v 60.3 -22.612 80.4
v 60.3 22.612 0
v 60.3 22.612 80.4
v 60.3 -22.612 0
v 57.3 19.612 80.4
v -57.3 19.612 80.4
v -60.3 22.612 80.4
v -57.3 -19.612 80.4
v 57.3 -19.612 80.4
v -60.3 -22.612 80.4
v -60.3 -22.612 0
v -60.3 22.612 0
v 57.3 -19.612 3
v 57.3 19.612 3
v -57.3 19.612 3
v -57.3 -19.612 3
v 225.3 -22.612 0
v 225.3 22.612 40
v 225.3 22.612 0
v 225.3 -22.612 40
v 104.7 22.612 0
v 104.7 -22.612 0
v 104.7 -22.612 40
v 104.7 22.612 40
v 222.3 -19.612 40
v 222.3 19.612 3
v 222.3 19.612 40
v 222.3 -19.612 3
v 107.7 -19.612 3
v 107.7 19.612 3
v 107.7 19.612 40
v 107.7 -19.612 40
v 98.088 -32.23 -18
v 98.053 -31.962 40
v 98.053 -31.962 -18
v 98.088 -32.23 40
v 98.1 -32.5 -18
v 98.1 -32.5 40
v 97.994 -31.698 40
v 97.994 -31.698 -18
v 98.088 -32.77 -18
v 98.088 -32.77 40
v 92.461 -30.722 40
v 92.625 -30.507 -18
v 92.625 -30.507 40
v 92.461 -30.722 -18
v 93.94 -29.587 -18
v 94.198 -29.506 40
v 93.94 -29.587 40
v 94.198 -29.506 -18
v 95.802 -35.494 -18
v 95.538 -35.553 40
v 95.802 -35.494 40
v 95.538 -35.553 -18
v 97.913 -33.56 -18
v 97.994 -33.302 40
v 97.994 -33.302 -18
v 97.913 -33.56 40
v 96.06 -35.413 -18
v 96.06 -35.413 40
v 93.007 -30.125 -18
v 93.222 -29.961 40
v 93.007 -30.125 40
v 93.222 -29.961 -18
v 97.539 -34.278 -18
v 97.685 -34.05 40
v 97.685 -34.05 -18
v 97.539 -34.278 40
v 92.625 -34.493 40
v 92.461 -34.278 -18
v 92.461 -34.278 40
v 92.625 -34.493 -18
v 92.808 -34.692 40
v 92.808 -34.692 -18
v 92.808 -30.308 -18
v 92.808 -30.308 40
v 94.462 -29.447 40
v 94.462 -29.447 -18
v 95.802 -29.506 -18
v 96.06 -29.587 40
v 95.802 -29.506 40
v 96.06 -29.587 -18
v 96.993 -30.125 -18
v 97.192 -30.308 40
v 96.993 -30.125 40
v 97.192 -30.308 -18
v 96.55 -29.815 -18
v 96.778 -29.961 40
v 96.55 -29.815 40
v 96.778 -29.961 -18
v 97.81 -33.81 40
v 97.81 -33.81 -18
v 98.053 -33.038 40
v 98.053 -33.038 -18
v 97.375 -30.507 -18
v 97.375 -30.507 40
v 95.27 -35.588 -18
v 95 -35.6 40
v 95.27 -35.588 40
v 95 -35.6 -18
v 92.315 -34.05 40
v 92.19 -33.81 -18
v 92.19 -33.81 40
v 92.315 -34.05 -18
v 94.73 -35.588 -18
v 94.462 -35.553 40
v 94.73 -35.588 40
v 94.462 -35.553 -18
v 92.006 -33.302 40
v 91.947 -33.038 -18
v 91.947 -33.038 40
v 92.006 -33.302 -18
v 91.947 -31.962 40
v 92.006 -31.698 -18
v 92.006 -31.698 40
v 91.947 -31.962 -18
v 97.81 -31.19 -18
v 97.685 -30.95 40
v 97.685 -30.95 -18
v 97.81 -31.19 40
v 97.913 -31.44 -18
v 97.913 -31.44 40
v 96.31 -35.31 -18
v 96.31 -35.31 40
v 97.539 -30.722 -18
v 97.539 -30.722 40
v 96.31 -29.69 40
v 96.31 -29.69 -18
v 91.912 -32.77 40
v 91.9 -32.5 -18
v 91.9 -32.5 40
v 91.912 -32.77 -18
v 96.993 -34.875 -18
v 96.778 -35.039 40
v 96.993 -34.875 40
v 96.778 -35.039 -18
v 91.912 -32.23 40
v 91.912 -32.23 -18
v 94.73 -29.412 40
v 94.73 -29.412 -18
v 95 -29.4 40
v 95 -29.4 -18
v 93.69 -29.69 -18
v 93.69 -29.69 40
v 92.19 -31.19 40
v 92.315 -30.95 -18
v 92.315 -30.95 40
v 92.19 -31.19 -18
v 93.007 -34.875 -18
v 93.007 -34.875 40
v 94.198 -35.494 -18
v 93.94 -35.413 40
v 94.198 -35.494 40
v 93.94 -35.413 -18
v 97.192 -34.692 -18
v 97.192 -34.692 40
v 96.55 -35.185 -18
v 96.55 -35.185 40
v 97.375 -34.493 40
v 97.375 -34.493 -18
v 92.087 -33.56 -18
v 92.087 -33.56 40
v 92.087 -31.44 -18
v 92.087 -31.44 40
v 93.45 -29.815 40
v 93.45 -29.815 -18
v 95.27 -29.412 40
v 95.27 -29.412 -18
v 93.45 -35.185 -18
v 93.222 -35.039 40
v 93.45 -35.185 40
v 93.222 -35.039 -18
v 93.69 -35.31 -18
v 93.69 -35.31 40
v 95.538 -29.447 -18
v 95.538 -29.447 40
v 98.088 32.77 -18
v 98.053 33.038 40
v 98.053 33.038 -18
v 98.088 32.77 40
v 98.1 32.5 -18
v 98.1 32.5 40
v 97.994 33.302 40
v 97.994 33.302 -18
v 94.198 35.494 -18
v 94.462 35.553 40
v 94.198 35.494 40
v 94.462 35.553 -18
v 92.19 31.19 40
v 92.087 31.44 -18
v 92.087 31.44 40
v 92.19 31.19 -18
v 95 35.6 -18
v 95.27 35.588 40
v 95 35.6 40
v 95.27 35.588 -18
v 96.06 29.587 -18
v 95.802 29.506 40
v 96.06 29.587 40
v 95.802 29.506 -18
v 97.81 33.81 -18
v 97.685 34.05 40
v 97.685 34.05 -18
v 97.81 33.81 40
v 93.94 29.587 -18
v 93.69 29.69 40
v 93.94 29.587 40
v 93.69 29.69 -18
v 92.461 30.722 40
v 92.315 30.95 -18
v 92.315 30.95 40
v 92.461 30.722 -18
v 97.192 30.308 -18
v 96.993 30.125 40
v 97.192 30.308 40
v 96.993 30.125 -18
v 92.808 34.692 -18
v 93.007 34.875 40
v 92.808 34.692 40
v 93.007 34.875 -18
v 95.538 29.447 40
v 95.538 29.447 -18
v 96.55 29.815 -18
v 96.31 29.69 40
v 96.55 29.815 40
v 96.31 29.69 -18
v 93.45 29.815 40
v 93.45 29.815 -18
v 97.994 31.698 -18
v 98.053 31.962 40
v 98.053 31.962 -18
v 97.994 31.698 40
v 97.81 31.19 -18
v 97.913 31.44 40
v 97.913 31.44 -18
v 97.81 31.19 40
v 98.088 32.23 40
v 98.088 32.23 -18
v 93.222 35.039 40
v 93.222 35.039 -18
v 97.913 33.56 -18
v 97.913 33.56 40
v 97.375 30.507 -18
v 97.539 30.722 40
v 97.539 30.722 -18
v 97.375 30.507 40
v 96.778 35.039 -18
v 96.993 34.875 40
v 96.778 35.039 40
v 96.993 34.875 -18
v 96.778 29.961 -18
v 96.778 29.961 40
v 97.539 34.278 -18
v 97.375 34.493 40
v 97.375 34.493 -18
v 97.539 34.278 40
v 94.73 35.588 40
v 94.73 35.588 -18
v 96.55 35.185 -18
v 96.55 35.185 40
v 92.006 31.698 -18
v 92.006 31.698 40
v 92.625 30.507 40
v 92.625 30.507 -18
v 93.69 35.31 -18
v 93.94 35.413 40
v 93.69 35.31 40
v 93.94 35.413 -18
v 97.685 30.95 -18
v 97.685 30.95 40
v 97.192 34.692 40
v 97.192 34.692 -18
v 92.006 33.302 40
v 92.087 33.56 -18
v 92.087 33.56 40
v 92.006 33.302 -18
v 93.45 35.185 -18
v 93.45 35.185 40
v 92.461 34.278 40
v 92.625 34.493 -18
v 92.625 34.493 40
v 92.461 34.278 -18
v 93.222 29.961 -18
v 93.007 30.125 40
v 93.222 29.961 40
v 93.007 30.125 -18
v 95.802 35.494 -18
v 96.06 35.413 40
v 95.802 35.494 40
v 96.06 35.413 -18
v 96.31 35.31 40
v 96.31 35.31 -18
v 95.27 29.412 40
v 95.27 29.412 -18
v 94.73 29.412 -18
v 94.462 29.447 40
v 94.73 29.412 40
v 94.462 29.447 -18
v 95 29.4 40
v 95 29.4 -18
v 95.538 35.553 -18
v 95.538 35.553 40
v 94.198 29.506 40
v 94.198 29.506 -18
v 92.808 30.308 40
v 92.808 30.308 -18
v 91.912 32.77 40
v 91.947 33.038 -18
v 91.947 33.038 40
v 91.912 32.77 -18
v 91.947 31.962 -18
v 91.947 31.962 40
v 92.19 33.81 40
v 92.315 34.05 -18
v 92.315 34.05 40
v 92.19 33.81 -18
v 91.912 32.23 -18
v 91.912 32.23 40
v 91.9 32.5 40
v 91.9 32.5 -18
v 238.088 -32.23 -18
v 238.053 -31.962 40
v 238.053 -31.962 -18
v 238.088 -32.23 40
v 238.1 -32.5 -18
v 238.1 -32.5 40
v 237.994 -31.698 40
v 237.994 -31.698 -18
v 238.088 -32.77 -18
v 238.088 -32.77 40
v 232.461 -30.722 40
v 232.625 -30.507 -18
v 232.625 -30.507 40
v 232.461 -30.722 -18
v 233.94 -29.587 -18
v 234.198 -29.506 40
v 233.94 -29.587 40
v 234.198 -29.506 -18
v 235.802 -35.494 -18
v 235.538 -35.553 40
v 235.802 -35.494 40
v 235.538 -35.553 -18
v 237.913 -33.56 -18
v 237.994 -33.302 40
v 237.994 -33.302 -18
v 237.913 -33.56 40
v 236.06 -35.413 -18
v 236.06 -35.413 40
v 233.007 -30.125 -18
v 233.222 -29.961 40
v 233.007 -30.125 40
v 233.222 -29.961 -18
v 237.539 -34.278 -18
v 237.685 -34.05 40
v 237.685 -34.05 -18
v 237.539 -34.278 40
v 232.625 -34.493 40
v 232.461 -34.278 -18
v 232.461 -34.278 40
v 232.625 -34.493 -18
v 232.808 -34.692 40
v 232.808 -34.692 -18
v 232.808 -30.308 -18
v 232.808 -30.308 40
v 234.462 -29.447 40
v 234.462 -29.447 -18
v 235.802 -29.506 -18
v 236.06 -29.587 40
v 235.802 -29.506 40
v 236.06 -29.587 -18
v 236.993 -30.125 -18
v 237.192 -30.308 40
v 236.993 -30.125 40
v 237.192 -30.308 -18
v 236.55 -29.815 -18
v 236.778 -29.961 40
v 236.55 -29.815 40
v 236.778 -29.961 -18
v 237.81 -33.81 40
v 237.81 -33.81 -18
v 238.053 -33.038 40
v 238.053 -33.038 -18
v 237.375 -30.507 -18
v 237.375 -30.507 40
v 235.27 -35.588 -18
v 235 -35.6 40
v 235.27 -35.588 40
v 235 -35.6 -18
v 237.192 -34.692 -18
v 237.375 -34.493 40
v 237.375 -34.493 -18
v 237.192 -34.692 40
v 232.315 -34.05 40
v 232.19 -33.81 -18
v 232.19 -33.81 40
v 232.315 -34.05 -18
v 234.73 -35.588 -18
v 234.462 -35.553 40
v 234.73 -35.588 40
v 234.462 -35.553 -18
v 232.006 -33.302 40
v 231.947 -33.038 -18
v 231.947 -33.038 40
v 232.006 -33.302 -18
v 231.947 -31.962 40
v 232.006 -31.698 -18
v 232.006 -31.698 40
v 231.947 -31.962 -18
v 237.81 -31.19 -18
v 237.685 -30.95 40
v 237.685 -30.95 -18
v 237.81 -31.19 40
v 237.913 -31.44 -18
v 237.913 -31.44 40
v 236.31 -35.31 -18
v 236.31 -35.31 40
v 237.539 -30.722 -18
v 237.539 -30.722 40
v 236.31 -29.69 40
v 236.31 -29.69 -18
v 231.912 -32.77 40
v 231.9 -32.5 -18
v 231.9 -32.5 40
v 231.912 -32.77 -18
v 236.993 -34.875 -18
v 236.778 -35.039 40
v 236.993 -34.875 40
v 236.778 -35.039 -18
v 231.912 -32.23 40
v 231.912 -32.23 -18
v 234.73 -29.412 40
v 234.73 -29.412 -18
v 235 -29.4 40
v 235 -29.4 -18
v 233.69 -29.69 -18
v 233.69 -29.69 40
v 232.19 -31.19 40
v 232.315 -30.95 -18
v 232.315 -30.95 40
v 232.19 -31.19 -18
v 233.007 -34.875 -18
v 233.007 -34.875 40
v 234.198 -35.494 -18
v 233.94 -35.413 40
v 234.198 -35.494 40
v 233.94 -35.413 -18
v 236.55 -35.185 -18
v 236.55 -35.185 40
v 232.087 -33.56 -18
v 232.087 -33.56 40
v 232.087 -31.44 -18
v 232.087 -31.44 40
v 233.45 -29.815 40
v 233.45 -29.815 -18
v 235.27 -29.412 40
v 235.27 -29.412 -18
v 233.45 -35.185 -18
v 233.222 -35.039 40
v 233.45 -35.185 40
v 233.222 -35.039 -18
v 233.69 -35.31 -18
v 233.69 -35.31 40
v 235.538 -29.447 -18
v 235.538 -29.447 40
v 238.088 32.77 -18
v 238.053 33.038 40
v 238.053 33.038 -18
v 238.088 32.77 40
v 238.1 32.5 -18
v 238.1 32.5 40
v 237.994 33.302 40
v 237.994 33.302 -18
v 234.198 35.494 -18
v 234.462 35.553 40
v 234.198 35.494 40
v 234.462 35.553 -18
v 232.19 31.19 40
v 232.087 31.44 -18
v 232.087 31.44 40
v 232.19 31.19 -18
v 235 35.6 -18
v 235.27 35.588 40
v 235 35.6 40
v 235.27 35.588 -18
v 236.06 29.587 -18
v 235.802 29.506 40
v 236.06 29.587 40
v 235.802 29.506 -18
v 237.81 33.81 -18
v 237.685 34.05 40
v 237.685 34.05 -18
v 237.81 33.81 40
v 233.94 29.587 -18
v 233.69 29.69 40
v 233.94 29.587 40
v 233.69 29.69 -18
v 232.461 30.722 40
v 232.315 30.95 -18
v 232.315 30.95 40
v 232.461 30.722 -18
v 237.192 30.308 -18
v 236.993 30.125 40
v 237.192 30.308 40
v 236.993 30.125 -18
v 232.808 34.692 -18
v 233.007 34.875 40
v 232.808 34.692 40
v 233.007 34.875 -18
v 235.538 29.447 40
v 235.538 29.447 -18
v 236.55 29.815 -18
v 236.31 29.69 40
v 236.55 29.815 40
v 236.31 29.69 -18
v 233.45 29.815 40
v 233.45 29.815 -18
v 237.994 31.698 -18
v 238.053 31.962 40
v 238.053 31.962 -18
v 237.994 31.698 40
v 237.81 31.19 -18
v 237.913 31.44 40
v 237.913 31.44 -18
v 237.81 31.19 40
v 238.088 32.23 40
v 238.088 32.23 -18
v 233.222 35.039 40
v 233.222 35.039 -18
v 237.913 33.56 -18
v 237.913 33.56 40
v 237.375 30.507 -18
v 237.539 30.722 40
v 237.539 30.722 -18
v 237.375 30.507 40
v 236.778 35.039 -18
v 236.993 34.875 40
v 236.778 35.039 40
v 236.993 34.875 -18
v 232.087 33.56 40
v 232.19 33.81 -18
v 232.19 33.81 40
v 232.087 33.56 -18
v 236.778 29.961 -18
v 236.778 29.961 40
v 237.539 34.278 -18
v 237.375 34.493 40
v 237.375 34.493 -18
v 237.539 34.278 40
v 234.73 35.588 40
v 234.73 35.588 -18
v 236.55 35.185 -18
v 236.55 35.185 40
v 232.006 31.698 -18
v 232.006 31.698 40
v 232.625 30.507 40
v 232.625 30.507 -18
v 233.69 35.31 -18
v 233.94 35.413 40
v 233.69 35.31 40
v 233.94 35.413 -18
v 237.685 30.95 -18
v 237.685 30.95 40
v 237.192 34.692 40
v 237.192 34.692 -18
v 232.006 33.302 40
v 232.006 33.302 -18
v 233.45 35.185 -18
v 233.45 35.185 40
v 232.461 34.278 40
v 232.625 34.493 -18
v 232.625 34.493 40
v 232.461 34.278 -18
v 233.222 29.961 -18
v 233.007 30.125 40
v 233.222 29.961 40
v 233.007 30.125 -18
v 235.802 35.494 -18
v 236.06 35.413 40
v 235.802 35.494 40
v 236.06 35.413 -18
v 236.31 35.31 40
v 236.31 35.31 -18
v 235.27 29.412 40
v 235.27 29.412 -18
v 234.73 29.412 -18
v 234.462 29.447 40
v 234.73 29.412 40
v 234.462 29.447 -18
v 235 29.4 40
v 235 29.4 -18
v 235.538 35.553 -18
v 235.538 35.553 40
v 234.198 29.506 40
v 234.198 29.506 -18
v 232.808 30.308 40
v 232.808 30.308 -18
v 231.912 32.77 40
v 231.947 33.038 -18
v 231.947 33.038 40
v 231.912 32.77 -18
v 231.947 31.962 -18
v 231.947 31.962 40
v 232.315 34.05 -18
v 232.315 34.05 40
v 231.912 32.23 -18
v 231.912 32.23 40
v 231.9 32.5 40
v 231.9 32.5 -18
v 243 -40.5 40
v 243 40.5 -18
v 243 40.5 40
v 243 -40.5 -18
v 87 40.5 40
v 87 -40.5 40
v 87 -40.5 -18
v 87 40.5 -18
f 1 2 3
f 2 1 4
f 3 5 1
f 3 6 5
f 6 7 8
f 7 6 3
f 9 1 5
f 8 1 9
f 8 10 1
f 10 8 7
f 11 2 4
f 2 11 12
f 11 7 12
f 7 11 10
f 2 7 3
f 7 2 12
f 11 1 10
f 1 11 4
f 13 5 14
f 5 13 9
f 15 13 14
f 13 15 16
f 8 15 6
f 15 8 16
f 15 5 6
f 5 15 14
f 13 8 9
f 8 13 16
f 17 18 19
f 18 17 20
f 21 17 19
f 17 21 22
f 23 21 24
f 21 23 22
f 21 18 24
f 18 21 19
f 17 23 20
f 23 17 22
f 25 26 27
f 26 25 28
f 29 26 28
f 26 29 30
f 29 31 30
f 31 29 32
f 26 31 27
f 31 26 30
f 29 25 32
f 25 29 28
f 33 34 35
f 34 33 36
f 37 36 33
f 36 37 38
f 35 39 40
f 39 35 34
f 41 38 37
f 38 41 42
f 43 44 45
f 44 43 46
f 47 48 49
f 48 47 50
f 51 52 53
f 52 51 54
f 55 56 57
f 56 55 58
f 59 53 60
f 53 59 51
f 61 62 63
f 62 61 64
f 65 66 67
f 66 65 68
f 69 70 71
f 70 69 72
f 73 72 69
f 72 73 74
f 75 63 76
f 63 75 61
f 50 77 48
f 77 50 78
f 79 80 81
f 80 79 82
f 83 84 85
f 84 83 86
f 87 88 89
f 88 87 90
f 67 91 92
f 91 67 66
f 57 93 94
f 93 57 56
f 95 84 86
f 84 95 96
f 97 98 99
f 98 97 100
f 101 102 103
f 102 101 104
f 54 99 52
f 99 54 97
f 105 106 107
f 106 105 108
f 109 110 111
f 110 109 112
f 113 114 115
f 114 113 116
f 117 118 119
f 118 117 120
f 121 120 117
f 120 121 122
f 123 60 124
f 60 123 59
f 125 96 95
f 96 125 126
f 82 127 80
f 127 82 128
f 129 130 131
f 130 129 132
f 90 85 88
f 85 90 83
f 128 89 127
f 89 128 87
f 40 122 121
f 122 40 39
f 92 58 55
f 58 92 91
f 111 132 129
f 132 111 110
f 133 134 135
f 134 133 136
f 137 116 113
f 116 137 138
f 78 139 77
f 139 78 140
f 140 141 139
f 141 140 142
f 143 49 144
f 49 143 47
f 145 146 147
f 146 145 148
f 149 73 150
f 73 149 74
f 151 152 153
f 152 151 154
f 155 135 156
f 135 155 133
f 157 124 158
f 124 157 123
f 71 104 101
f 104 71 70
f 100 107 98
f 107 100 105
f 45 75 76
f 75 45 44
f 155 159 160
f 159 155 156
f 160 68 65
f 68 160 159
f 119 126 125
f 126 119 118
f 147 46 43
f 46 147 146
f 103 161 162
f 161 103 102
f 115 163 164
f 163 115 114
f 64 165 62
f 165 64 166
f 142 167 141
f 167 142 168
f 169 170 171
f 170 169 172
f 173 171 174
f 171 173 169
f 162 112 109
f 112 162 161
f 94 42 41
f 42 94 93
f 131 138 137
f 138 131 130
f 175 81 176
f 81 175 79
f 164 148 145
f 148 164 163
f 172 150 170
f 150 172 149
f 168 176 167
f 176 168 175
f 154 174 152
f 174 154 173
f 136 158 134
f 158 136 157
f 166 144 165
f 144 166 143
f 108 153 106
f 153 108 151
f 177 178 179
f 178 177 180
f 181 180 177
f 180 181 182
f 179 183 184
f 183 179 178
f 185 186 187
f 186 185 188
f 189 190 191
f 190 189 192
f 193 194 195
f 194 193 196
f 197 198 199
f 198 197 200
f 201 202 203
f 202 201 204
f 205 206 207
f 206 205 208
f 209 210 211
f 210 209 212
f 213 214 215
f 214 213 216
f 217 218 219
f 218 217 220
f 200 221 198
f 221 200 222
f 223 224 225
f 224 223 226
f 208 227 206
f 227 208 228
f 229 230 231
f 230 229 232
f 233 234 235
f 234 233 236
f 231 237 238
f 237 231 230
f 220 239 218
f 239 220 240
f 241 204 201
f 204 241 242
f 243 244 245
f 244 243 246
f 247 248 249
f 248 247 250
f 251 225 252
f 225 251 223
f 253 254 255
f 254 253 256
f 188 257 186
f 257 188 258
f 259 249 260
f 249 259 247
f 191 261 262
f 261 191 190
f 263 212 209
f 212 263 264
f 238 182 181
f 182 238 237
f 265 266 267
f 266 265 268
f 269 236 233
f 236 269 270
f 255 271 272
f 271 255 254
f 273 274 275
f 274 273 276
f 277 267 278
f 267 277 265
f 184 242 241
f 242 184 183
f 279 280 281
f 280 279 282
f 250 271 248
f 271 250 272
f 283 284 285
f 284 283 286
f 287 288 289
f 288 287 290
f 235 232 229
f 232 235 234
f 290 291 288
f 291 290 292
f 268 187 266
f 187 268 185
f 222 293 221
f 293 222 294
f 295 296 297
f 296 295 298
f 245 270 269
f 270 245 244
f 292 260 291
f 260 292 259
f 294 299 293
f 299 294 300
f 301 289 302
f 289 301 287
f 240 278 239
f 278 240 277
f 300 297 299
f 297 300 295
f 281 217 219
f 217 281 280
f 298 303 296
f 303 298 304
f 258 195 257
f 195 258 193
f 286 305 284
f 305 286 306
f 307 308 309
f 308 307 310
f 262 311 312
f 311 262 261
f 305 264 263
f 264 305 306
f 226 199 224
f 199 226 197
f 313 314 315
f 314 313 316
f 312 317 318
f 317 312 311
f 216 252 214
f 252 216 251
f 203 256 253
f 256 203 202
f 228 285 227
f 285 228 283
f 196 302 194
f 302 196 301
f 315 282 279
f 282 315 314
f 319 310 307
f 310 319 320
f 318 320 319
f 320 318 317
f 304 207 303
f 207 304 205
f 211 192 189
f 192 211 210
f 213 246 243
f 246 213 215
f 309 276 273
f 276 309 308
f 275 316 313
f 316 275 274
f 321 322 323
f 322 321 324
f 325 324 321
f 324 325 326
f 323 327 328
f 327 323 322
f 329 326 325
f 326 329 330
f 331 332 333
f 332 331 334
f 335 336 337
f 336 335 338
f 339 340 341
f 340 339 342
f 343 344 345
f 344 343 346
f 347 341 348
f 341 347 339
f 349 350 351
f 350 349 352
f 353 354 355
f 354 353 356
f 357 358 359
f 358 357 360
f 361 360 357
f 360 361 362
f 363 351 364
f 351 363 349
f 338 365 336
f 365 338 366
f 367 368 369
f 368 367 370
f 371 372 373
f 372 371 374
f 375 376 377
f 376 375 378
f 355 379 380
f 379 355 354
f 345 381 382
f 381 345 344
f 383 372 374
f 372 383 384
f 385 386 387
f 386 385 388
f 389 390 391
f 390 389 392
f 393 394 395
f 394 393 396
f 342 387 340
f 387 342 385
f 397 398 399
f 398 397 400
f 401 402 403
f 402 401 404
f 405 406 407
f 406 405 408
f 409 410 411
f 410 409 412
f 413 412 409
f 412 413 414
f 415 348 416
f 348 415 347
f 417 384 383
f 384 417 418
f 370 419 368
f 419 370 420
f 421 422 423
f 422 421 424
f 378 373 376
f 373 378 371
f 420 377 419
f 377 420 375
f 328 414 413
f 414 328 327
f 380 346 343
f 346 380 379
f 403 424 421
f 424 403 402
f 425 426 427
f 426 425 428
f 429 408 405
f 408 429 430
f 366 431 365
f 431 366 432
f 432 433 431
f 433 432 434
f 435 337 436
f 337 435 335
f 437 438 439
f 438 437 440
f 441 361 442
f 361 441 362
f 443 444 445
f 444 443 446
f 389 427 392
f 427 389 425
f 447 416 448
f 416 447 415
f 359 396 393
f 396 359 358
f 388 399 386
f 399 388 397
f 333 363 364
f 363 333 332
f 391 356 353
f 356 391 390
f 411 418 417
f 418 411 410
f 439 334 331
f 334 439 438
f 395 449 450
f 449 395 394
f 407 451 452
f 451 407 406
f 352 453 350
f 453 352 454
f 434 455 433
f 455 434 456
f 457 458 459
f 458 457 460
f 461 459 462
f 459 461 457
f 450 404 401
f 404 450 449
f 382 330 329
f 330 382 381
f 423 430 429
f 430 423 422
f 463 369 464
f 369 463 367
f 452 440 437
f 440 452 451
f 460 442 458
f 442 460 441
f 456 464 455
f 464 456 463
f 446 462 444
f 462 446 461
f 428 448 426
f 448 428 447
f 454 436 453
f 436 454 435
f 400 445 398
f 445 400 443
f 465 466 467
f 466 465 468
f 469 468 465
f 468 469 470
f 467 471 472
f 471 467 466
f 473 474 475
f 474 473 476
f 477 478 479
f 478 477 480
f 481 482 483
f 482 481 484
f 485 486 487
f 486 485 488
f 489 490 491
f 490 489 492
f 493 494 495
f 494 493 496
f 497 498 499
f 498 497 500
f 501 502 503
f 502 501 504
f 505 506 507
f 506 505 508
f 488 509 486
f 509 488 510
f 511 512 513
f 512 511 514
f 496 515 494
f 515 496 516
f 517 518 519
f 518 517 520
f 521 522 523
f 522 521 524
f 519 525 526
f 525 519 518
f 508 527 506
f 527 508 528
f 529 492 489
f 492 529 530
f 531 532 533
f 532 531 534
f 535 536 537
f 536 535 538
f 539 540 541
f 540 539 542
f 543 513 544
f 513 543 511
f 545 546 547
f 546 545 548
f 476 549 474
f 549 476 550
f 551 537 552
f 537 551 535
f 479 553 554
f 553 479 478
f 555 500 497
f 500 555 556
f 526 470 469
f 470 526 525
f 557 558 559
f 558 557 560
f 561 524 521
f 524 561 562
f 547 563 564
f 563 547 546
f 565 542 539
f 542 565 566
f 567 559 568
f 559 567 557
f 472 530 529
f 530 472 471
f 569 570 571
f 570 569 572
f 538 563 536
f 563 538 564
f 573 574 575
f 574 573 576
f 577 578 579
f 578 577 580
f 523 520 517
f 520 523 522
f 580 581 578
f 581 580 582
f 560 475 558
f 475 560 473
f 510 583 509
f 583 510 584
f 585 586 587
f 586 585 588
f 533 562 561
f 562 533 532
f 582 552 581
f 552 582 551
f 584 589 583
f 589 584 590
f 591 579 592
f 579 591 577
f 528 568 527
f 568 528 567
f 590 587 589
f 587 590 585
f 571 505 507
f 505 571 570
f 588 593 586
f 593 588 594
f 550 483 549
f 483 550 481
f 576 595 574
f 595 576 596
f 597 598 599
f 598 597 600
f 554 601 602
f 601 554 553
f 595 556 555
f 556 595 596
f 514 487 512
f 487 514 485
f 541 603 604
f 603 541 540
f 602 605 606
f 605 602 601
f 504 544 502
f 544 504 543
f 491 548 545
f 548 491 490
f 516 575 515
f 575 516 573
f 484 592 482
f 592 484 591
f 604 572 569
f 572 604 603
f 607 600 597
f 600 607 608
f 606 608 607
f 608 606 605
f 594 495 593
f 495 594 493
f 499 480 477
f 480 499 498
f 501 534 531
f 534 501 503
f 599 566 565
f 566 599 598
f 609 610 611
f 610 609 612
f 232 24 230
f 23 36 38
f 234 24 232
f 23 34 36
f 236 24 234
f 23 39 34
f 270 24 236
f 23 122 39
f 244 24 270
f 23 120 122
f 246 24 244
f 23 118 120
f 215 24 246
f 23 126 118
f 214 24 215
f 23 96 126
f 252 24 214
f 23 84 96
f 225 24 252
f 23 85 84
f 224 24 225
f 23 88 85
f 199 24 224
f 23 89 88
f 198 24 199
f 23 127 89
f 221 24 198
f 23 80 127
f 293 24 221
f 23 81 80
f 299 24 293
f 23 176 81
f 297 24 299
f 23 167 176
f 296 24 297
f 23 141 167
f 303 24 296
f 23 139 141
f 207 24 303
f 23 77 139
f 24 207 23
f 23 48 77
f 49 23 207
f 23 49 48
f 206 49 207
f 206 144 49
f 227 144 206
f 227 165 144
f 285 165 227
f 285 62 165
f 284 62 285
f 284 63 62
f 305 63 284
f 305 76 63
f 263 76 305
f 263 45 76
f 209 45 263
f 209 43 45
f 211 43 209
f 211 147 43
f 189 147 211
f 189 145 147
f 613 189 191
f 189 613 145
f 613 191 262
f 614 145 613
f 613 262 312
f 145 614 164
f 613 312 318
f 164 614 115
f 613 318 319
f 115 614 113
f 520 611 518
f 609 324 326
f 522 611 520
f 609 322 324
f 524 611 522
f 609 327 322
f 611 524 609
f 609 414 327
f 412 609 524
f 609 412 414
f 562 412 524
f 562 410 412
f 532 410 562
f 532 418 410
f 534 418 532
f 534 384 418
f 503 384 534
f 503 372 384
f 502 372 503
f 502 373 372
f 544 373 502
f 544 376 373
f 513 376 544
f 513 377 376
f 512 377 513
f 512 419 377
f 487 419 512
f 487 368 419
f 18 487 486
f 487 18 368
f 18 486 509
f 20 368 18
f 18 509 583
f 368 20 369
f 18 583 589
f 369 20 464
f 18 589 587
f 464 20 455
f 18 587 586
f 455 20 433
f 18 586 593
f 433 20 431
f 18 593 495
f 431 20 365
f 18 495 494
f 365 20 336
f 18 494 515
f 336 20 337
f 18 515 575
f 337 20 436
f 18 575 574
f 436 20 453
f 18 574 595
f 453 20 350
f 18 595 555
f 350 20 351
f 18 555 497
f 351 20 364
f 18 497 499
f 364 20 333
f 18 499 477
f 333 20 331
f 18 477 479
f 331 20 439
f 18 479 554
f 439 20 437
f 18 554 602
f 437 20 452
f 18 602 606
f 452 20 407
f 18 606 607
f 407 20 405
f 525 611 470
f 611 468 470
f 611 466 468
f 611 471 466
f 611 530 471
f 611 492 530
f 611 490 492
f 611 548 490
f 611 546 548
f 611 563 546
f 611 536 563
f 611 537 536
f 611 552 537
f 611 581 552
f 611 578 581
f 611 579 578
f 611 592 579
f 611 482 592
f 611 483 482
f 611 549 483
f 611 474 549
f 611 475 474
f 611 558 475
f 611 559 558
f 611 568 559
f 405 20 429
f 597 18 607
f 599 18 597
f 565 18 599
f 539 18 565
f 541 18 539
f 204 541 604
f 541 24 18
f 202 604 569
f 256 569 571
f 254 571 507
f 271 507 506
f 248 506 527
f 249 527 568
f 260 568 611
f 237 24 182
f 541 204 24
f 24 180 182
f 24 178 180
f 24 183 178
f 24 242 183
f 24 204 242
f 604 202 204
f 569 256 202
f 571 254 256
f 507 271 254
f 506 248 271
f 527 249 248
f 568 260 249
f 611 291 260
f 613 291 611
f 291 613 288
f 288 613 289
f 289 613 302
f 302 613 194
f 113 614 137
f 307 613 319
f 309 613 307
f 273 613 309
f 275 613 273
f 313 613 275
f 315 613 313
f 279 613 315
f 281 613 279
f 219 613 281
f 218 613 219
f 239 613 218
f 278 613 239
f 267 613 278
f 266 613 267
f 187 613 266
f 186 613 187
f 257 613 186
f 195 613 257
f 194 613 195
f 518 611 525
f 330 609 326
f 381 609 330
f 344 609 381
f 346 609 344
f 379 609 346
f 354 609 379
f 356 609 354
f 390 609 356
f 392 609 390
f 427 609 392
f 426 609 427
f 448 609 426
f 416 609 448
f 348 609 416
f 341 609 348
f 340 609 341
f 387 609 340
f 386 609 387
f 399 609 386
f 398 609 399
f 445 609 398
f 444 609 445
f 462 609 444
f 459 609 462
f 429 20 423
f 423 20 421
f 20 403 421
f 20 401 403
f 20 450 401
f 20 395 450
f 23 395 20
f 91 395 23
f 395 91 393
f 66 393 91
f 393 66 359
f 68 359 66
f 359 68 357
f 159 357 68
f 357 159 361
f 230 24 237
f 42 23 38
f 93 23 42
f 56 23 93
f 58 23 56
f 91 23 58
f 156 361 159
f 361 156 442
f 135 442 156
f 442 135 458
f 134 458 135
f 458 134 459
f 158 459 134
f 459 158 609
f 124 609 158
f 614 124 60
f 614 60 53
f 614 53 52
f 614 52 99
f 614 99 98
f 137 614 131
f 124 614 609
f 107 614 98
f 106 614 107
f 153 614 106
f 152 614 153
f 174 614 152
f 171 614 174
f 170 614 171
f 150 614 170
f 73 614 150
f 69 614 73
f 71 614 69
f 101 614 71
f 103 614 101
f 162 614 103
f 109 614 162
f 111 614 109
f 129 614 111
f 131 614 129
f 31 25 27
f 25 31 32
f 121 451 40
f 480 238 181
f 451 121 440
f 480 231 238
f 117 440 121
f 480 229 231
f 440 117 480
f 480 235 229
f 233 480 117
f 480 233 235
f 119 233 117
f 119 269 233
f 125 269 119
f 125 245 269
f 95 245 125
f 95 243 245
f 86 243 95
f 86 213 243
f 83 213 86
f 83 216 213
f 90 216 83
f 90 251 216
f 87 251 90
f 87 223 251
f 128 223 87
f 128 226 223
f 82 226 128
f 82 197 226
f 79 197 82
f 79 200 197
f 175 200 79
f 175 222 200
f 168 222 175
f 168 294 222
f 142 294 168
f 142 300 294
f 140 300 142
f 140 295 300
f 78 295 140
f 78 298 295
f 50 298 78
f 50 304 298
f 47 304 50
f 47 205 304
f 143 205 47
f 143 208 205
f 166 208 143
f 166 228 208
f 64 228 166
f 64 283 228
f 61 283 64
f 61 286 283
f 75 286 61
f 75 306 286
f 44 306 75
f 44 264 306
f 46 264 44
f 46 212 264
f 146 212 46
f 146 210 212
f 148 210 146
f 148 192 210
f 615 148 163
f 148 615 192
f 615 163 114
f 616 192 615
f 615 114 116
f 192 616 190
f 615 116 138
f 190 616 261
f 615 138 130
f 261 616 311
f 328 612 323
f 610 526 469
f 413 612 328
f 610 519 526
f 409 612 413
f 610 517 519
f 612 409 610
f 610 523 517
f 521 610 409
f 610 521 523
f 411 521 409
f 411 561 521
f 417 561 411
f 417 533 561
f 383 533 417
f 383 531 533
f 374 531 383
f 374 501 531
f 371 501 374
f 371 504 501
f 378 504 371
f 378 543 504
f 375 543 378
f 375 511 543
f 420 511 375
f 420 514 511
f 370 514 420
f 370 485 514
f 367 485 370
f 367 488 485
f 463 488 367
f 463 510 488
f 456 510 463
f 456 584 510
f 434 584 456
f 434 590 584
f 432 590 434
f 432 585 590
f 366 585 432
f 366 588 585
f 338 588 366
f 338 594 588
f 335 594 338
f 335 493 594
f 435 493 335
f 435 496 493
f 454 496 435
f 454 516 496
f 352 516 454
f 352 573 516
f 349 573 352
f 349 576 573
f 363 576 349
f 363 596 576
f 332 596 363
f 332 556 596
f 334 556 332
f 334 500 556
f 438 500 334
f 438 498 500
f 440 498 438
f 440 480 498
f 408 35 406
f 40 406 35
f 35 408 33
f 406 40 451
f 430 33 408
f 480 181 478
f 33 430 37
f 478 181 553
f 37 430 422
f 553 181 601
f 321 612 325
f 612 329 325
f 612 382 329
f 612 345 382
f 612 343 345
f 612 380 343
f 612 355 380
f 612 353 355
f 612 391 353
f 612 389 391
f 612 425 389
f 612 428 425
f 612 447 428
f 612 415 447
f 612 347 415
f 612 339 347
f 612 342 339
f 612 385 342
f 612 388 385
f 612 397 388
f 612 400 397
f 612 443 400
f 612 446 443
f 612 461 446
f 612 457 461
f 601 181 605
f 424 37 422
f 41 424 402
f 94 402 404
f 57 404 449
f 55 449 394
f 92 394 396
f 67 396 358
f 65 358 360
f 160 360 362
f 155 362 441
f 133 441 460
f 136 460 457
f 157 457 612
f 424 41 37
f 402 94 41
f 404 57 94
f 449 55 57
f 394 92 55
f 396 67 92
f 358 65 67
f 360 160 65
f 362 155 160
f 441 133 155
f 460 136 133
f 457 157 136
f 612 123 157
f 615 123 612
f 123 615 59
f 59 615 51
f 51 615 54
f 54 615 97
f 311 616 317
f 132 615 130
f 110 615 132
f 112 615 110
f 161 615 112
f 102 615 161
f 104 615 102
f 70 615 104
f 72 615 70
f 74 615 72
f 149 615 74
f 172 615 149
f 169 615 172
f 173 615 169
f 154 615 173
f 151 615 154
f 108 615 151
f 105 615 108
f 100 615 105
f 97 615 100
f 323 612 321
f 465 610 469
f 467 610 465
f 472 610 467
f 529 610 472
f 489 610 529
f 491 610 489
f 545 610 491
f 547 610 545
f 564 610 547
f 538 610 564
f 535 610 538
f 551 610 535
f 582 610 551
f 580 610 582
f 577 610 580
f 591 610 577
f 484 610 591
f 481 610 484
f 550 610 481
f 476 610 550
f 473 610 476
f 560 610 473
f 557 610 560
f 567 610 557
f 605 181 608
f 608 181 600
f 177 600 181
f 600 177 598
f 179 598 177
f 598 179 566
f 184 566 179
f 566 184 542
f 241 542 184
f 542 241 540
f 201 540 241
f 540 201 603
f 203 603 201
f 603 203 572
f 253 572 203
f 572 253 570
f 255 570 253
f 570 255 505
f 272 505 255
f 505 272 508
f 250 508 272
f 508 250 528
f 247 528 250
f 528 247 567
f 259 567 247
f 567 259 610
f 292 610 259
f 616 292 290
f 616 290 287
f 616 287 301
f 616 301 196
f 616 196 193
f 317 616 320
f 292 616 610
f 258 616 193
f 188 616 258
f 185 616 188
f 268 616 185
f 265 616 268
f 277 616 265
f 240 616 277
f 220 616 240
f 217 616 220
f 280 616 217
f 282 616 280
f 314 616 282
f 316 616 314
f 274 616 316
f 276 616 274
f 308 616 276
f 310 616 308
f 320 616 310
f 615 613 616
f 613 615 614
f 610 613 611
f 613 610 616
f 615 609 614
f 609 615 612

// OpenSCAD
// ChronicleRAG & InsightChat — Parametric Millimetric CAD & Mold Generator (.scad)
// Change any variable below in millimeters (mm) — holes, wall thickness, and mold cavity update automatically!

width_mm          = 120.0;
height_mm         = 45.0;
depth_mm          = 80.0;
wall_thickness_mm = 3.0;
hole_diameter_mm  = 4.2;   // e.g. 3.2mm for M3 clearance, 2.5mm for M3 self-tap
hole_pitch_x_mm   = 136.0;
hole_pitch_y_mm   = 216.0;
fit_tolerance_mm  = 0.2;
mold_draft_deg    = 2.0;
mold_shrink_pct   = 0.5;
render_mode       = "part_and_mold"; // "part_only" | "mold_cavity_and_core" | "part_and_mold"

$fn = 72; // High circular hole accuracy

module precision_part() {
    scale_f = 1.0 + (mold_shrink_pct / 100.0);
    W = width_mm * scale_f;
    H = height_mm * scale_f;
    D = depth_mm * scale_f;
    d_hole = hole_diameter_mm + fit_tolerance_mm;

    difference() {
        // Outer shell
        translate([-W/2, -H/2, 0])
            cube([W, H, D]);

        // Inner cavity
        translate([-(W/2) + wall_thickness_mm, -(H/2) + wall_thickness_mm, wall_thickness_mm])
            cube([W - 2*wall_thickness_mm, H - 2*wall_thickness_mm, D + 1.0]);

        // 4 Precision Mounting Holes
        for (sx = [-1, 1]) {
            for (sy = [-1, 1]) {
                translate([sx * (hole_pitch_x_mm / 2), sy * (hole_pitch_y_mm / 2), -1.0])
                    cylinder(h = D + 2.0, d = d_hole);
            }
        }
    }
}

module injection_mold_lower_cavity() {
    margin = 18.0;
    W_mold = width_mm + 2 * margin;
    H_mold = height_mm + 2 * margin;
    D_mold = (depth_mm / 2) + margin;
    difference() {
        translate([-W_mold/2, -H_mold/2, -margin])
            cube([W_mold, H_mold, D_mold]);
        precision_part();
        // 4 Mold Registration Alignment Dowel Pins (6.0 mm)
        for (sx = [-1, 1])
            for (sy = [-1, 1])
                translate([sx * (W_mold/2 - 8), sy * (H_mold/2 - 8), -margin - 1])
                    cylinder(h = D_mold + 2, d = 6.0 + fit_tolerance_mm);
    }
}

if (render_mode == "part_only") {
    precision_part();
} else if (render_mode == "mold_cavity_and_core") {
    injection_mold_lower_cavity();
} else {
    precision_part();
    translate([width_mm + 45, 0, 0])
        injection_mold_lower_cavity();
}
